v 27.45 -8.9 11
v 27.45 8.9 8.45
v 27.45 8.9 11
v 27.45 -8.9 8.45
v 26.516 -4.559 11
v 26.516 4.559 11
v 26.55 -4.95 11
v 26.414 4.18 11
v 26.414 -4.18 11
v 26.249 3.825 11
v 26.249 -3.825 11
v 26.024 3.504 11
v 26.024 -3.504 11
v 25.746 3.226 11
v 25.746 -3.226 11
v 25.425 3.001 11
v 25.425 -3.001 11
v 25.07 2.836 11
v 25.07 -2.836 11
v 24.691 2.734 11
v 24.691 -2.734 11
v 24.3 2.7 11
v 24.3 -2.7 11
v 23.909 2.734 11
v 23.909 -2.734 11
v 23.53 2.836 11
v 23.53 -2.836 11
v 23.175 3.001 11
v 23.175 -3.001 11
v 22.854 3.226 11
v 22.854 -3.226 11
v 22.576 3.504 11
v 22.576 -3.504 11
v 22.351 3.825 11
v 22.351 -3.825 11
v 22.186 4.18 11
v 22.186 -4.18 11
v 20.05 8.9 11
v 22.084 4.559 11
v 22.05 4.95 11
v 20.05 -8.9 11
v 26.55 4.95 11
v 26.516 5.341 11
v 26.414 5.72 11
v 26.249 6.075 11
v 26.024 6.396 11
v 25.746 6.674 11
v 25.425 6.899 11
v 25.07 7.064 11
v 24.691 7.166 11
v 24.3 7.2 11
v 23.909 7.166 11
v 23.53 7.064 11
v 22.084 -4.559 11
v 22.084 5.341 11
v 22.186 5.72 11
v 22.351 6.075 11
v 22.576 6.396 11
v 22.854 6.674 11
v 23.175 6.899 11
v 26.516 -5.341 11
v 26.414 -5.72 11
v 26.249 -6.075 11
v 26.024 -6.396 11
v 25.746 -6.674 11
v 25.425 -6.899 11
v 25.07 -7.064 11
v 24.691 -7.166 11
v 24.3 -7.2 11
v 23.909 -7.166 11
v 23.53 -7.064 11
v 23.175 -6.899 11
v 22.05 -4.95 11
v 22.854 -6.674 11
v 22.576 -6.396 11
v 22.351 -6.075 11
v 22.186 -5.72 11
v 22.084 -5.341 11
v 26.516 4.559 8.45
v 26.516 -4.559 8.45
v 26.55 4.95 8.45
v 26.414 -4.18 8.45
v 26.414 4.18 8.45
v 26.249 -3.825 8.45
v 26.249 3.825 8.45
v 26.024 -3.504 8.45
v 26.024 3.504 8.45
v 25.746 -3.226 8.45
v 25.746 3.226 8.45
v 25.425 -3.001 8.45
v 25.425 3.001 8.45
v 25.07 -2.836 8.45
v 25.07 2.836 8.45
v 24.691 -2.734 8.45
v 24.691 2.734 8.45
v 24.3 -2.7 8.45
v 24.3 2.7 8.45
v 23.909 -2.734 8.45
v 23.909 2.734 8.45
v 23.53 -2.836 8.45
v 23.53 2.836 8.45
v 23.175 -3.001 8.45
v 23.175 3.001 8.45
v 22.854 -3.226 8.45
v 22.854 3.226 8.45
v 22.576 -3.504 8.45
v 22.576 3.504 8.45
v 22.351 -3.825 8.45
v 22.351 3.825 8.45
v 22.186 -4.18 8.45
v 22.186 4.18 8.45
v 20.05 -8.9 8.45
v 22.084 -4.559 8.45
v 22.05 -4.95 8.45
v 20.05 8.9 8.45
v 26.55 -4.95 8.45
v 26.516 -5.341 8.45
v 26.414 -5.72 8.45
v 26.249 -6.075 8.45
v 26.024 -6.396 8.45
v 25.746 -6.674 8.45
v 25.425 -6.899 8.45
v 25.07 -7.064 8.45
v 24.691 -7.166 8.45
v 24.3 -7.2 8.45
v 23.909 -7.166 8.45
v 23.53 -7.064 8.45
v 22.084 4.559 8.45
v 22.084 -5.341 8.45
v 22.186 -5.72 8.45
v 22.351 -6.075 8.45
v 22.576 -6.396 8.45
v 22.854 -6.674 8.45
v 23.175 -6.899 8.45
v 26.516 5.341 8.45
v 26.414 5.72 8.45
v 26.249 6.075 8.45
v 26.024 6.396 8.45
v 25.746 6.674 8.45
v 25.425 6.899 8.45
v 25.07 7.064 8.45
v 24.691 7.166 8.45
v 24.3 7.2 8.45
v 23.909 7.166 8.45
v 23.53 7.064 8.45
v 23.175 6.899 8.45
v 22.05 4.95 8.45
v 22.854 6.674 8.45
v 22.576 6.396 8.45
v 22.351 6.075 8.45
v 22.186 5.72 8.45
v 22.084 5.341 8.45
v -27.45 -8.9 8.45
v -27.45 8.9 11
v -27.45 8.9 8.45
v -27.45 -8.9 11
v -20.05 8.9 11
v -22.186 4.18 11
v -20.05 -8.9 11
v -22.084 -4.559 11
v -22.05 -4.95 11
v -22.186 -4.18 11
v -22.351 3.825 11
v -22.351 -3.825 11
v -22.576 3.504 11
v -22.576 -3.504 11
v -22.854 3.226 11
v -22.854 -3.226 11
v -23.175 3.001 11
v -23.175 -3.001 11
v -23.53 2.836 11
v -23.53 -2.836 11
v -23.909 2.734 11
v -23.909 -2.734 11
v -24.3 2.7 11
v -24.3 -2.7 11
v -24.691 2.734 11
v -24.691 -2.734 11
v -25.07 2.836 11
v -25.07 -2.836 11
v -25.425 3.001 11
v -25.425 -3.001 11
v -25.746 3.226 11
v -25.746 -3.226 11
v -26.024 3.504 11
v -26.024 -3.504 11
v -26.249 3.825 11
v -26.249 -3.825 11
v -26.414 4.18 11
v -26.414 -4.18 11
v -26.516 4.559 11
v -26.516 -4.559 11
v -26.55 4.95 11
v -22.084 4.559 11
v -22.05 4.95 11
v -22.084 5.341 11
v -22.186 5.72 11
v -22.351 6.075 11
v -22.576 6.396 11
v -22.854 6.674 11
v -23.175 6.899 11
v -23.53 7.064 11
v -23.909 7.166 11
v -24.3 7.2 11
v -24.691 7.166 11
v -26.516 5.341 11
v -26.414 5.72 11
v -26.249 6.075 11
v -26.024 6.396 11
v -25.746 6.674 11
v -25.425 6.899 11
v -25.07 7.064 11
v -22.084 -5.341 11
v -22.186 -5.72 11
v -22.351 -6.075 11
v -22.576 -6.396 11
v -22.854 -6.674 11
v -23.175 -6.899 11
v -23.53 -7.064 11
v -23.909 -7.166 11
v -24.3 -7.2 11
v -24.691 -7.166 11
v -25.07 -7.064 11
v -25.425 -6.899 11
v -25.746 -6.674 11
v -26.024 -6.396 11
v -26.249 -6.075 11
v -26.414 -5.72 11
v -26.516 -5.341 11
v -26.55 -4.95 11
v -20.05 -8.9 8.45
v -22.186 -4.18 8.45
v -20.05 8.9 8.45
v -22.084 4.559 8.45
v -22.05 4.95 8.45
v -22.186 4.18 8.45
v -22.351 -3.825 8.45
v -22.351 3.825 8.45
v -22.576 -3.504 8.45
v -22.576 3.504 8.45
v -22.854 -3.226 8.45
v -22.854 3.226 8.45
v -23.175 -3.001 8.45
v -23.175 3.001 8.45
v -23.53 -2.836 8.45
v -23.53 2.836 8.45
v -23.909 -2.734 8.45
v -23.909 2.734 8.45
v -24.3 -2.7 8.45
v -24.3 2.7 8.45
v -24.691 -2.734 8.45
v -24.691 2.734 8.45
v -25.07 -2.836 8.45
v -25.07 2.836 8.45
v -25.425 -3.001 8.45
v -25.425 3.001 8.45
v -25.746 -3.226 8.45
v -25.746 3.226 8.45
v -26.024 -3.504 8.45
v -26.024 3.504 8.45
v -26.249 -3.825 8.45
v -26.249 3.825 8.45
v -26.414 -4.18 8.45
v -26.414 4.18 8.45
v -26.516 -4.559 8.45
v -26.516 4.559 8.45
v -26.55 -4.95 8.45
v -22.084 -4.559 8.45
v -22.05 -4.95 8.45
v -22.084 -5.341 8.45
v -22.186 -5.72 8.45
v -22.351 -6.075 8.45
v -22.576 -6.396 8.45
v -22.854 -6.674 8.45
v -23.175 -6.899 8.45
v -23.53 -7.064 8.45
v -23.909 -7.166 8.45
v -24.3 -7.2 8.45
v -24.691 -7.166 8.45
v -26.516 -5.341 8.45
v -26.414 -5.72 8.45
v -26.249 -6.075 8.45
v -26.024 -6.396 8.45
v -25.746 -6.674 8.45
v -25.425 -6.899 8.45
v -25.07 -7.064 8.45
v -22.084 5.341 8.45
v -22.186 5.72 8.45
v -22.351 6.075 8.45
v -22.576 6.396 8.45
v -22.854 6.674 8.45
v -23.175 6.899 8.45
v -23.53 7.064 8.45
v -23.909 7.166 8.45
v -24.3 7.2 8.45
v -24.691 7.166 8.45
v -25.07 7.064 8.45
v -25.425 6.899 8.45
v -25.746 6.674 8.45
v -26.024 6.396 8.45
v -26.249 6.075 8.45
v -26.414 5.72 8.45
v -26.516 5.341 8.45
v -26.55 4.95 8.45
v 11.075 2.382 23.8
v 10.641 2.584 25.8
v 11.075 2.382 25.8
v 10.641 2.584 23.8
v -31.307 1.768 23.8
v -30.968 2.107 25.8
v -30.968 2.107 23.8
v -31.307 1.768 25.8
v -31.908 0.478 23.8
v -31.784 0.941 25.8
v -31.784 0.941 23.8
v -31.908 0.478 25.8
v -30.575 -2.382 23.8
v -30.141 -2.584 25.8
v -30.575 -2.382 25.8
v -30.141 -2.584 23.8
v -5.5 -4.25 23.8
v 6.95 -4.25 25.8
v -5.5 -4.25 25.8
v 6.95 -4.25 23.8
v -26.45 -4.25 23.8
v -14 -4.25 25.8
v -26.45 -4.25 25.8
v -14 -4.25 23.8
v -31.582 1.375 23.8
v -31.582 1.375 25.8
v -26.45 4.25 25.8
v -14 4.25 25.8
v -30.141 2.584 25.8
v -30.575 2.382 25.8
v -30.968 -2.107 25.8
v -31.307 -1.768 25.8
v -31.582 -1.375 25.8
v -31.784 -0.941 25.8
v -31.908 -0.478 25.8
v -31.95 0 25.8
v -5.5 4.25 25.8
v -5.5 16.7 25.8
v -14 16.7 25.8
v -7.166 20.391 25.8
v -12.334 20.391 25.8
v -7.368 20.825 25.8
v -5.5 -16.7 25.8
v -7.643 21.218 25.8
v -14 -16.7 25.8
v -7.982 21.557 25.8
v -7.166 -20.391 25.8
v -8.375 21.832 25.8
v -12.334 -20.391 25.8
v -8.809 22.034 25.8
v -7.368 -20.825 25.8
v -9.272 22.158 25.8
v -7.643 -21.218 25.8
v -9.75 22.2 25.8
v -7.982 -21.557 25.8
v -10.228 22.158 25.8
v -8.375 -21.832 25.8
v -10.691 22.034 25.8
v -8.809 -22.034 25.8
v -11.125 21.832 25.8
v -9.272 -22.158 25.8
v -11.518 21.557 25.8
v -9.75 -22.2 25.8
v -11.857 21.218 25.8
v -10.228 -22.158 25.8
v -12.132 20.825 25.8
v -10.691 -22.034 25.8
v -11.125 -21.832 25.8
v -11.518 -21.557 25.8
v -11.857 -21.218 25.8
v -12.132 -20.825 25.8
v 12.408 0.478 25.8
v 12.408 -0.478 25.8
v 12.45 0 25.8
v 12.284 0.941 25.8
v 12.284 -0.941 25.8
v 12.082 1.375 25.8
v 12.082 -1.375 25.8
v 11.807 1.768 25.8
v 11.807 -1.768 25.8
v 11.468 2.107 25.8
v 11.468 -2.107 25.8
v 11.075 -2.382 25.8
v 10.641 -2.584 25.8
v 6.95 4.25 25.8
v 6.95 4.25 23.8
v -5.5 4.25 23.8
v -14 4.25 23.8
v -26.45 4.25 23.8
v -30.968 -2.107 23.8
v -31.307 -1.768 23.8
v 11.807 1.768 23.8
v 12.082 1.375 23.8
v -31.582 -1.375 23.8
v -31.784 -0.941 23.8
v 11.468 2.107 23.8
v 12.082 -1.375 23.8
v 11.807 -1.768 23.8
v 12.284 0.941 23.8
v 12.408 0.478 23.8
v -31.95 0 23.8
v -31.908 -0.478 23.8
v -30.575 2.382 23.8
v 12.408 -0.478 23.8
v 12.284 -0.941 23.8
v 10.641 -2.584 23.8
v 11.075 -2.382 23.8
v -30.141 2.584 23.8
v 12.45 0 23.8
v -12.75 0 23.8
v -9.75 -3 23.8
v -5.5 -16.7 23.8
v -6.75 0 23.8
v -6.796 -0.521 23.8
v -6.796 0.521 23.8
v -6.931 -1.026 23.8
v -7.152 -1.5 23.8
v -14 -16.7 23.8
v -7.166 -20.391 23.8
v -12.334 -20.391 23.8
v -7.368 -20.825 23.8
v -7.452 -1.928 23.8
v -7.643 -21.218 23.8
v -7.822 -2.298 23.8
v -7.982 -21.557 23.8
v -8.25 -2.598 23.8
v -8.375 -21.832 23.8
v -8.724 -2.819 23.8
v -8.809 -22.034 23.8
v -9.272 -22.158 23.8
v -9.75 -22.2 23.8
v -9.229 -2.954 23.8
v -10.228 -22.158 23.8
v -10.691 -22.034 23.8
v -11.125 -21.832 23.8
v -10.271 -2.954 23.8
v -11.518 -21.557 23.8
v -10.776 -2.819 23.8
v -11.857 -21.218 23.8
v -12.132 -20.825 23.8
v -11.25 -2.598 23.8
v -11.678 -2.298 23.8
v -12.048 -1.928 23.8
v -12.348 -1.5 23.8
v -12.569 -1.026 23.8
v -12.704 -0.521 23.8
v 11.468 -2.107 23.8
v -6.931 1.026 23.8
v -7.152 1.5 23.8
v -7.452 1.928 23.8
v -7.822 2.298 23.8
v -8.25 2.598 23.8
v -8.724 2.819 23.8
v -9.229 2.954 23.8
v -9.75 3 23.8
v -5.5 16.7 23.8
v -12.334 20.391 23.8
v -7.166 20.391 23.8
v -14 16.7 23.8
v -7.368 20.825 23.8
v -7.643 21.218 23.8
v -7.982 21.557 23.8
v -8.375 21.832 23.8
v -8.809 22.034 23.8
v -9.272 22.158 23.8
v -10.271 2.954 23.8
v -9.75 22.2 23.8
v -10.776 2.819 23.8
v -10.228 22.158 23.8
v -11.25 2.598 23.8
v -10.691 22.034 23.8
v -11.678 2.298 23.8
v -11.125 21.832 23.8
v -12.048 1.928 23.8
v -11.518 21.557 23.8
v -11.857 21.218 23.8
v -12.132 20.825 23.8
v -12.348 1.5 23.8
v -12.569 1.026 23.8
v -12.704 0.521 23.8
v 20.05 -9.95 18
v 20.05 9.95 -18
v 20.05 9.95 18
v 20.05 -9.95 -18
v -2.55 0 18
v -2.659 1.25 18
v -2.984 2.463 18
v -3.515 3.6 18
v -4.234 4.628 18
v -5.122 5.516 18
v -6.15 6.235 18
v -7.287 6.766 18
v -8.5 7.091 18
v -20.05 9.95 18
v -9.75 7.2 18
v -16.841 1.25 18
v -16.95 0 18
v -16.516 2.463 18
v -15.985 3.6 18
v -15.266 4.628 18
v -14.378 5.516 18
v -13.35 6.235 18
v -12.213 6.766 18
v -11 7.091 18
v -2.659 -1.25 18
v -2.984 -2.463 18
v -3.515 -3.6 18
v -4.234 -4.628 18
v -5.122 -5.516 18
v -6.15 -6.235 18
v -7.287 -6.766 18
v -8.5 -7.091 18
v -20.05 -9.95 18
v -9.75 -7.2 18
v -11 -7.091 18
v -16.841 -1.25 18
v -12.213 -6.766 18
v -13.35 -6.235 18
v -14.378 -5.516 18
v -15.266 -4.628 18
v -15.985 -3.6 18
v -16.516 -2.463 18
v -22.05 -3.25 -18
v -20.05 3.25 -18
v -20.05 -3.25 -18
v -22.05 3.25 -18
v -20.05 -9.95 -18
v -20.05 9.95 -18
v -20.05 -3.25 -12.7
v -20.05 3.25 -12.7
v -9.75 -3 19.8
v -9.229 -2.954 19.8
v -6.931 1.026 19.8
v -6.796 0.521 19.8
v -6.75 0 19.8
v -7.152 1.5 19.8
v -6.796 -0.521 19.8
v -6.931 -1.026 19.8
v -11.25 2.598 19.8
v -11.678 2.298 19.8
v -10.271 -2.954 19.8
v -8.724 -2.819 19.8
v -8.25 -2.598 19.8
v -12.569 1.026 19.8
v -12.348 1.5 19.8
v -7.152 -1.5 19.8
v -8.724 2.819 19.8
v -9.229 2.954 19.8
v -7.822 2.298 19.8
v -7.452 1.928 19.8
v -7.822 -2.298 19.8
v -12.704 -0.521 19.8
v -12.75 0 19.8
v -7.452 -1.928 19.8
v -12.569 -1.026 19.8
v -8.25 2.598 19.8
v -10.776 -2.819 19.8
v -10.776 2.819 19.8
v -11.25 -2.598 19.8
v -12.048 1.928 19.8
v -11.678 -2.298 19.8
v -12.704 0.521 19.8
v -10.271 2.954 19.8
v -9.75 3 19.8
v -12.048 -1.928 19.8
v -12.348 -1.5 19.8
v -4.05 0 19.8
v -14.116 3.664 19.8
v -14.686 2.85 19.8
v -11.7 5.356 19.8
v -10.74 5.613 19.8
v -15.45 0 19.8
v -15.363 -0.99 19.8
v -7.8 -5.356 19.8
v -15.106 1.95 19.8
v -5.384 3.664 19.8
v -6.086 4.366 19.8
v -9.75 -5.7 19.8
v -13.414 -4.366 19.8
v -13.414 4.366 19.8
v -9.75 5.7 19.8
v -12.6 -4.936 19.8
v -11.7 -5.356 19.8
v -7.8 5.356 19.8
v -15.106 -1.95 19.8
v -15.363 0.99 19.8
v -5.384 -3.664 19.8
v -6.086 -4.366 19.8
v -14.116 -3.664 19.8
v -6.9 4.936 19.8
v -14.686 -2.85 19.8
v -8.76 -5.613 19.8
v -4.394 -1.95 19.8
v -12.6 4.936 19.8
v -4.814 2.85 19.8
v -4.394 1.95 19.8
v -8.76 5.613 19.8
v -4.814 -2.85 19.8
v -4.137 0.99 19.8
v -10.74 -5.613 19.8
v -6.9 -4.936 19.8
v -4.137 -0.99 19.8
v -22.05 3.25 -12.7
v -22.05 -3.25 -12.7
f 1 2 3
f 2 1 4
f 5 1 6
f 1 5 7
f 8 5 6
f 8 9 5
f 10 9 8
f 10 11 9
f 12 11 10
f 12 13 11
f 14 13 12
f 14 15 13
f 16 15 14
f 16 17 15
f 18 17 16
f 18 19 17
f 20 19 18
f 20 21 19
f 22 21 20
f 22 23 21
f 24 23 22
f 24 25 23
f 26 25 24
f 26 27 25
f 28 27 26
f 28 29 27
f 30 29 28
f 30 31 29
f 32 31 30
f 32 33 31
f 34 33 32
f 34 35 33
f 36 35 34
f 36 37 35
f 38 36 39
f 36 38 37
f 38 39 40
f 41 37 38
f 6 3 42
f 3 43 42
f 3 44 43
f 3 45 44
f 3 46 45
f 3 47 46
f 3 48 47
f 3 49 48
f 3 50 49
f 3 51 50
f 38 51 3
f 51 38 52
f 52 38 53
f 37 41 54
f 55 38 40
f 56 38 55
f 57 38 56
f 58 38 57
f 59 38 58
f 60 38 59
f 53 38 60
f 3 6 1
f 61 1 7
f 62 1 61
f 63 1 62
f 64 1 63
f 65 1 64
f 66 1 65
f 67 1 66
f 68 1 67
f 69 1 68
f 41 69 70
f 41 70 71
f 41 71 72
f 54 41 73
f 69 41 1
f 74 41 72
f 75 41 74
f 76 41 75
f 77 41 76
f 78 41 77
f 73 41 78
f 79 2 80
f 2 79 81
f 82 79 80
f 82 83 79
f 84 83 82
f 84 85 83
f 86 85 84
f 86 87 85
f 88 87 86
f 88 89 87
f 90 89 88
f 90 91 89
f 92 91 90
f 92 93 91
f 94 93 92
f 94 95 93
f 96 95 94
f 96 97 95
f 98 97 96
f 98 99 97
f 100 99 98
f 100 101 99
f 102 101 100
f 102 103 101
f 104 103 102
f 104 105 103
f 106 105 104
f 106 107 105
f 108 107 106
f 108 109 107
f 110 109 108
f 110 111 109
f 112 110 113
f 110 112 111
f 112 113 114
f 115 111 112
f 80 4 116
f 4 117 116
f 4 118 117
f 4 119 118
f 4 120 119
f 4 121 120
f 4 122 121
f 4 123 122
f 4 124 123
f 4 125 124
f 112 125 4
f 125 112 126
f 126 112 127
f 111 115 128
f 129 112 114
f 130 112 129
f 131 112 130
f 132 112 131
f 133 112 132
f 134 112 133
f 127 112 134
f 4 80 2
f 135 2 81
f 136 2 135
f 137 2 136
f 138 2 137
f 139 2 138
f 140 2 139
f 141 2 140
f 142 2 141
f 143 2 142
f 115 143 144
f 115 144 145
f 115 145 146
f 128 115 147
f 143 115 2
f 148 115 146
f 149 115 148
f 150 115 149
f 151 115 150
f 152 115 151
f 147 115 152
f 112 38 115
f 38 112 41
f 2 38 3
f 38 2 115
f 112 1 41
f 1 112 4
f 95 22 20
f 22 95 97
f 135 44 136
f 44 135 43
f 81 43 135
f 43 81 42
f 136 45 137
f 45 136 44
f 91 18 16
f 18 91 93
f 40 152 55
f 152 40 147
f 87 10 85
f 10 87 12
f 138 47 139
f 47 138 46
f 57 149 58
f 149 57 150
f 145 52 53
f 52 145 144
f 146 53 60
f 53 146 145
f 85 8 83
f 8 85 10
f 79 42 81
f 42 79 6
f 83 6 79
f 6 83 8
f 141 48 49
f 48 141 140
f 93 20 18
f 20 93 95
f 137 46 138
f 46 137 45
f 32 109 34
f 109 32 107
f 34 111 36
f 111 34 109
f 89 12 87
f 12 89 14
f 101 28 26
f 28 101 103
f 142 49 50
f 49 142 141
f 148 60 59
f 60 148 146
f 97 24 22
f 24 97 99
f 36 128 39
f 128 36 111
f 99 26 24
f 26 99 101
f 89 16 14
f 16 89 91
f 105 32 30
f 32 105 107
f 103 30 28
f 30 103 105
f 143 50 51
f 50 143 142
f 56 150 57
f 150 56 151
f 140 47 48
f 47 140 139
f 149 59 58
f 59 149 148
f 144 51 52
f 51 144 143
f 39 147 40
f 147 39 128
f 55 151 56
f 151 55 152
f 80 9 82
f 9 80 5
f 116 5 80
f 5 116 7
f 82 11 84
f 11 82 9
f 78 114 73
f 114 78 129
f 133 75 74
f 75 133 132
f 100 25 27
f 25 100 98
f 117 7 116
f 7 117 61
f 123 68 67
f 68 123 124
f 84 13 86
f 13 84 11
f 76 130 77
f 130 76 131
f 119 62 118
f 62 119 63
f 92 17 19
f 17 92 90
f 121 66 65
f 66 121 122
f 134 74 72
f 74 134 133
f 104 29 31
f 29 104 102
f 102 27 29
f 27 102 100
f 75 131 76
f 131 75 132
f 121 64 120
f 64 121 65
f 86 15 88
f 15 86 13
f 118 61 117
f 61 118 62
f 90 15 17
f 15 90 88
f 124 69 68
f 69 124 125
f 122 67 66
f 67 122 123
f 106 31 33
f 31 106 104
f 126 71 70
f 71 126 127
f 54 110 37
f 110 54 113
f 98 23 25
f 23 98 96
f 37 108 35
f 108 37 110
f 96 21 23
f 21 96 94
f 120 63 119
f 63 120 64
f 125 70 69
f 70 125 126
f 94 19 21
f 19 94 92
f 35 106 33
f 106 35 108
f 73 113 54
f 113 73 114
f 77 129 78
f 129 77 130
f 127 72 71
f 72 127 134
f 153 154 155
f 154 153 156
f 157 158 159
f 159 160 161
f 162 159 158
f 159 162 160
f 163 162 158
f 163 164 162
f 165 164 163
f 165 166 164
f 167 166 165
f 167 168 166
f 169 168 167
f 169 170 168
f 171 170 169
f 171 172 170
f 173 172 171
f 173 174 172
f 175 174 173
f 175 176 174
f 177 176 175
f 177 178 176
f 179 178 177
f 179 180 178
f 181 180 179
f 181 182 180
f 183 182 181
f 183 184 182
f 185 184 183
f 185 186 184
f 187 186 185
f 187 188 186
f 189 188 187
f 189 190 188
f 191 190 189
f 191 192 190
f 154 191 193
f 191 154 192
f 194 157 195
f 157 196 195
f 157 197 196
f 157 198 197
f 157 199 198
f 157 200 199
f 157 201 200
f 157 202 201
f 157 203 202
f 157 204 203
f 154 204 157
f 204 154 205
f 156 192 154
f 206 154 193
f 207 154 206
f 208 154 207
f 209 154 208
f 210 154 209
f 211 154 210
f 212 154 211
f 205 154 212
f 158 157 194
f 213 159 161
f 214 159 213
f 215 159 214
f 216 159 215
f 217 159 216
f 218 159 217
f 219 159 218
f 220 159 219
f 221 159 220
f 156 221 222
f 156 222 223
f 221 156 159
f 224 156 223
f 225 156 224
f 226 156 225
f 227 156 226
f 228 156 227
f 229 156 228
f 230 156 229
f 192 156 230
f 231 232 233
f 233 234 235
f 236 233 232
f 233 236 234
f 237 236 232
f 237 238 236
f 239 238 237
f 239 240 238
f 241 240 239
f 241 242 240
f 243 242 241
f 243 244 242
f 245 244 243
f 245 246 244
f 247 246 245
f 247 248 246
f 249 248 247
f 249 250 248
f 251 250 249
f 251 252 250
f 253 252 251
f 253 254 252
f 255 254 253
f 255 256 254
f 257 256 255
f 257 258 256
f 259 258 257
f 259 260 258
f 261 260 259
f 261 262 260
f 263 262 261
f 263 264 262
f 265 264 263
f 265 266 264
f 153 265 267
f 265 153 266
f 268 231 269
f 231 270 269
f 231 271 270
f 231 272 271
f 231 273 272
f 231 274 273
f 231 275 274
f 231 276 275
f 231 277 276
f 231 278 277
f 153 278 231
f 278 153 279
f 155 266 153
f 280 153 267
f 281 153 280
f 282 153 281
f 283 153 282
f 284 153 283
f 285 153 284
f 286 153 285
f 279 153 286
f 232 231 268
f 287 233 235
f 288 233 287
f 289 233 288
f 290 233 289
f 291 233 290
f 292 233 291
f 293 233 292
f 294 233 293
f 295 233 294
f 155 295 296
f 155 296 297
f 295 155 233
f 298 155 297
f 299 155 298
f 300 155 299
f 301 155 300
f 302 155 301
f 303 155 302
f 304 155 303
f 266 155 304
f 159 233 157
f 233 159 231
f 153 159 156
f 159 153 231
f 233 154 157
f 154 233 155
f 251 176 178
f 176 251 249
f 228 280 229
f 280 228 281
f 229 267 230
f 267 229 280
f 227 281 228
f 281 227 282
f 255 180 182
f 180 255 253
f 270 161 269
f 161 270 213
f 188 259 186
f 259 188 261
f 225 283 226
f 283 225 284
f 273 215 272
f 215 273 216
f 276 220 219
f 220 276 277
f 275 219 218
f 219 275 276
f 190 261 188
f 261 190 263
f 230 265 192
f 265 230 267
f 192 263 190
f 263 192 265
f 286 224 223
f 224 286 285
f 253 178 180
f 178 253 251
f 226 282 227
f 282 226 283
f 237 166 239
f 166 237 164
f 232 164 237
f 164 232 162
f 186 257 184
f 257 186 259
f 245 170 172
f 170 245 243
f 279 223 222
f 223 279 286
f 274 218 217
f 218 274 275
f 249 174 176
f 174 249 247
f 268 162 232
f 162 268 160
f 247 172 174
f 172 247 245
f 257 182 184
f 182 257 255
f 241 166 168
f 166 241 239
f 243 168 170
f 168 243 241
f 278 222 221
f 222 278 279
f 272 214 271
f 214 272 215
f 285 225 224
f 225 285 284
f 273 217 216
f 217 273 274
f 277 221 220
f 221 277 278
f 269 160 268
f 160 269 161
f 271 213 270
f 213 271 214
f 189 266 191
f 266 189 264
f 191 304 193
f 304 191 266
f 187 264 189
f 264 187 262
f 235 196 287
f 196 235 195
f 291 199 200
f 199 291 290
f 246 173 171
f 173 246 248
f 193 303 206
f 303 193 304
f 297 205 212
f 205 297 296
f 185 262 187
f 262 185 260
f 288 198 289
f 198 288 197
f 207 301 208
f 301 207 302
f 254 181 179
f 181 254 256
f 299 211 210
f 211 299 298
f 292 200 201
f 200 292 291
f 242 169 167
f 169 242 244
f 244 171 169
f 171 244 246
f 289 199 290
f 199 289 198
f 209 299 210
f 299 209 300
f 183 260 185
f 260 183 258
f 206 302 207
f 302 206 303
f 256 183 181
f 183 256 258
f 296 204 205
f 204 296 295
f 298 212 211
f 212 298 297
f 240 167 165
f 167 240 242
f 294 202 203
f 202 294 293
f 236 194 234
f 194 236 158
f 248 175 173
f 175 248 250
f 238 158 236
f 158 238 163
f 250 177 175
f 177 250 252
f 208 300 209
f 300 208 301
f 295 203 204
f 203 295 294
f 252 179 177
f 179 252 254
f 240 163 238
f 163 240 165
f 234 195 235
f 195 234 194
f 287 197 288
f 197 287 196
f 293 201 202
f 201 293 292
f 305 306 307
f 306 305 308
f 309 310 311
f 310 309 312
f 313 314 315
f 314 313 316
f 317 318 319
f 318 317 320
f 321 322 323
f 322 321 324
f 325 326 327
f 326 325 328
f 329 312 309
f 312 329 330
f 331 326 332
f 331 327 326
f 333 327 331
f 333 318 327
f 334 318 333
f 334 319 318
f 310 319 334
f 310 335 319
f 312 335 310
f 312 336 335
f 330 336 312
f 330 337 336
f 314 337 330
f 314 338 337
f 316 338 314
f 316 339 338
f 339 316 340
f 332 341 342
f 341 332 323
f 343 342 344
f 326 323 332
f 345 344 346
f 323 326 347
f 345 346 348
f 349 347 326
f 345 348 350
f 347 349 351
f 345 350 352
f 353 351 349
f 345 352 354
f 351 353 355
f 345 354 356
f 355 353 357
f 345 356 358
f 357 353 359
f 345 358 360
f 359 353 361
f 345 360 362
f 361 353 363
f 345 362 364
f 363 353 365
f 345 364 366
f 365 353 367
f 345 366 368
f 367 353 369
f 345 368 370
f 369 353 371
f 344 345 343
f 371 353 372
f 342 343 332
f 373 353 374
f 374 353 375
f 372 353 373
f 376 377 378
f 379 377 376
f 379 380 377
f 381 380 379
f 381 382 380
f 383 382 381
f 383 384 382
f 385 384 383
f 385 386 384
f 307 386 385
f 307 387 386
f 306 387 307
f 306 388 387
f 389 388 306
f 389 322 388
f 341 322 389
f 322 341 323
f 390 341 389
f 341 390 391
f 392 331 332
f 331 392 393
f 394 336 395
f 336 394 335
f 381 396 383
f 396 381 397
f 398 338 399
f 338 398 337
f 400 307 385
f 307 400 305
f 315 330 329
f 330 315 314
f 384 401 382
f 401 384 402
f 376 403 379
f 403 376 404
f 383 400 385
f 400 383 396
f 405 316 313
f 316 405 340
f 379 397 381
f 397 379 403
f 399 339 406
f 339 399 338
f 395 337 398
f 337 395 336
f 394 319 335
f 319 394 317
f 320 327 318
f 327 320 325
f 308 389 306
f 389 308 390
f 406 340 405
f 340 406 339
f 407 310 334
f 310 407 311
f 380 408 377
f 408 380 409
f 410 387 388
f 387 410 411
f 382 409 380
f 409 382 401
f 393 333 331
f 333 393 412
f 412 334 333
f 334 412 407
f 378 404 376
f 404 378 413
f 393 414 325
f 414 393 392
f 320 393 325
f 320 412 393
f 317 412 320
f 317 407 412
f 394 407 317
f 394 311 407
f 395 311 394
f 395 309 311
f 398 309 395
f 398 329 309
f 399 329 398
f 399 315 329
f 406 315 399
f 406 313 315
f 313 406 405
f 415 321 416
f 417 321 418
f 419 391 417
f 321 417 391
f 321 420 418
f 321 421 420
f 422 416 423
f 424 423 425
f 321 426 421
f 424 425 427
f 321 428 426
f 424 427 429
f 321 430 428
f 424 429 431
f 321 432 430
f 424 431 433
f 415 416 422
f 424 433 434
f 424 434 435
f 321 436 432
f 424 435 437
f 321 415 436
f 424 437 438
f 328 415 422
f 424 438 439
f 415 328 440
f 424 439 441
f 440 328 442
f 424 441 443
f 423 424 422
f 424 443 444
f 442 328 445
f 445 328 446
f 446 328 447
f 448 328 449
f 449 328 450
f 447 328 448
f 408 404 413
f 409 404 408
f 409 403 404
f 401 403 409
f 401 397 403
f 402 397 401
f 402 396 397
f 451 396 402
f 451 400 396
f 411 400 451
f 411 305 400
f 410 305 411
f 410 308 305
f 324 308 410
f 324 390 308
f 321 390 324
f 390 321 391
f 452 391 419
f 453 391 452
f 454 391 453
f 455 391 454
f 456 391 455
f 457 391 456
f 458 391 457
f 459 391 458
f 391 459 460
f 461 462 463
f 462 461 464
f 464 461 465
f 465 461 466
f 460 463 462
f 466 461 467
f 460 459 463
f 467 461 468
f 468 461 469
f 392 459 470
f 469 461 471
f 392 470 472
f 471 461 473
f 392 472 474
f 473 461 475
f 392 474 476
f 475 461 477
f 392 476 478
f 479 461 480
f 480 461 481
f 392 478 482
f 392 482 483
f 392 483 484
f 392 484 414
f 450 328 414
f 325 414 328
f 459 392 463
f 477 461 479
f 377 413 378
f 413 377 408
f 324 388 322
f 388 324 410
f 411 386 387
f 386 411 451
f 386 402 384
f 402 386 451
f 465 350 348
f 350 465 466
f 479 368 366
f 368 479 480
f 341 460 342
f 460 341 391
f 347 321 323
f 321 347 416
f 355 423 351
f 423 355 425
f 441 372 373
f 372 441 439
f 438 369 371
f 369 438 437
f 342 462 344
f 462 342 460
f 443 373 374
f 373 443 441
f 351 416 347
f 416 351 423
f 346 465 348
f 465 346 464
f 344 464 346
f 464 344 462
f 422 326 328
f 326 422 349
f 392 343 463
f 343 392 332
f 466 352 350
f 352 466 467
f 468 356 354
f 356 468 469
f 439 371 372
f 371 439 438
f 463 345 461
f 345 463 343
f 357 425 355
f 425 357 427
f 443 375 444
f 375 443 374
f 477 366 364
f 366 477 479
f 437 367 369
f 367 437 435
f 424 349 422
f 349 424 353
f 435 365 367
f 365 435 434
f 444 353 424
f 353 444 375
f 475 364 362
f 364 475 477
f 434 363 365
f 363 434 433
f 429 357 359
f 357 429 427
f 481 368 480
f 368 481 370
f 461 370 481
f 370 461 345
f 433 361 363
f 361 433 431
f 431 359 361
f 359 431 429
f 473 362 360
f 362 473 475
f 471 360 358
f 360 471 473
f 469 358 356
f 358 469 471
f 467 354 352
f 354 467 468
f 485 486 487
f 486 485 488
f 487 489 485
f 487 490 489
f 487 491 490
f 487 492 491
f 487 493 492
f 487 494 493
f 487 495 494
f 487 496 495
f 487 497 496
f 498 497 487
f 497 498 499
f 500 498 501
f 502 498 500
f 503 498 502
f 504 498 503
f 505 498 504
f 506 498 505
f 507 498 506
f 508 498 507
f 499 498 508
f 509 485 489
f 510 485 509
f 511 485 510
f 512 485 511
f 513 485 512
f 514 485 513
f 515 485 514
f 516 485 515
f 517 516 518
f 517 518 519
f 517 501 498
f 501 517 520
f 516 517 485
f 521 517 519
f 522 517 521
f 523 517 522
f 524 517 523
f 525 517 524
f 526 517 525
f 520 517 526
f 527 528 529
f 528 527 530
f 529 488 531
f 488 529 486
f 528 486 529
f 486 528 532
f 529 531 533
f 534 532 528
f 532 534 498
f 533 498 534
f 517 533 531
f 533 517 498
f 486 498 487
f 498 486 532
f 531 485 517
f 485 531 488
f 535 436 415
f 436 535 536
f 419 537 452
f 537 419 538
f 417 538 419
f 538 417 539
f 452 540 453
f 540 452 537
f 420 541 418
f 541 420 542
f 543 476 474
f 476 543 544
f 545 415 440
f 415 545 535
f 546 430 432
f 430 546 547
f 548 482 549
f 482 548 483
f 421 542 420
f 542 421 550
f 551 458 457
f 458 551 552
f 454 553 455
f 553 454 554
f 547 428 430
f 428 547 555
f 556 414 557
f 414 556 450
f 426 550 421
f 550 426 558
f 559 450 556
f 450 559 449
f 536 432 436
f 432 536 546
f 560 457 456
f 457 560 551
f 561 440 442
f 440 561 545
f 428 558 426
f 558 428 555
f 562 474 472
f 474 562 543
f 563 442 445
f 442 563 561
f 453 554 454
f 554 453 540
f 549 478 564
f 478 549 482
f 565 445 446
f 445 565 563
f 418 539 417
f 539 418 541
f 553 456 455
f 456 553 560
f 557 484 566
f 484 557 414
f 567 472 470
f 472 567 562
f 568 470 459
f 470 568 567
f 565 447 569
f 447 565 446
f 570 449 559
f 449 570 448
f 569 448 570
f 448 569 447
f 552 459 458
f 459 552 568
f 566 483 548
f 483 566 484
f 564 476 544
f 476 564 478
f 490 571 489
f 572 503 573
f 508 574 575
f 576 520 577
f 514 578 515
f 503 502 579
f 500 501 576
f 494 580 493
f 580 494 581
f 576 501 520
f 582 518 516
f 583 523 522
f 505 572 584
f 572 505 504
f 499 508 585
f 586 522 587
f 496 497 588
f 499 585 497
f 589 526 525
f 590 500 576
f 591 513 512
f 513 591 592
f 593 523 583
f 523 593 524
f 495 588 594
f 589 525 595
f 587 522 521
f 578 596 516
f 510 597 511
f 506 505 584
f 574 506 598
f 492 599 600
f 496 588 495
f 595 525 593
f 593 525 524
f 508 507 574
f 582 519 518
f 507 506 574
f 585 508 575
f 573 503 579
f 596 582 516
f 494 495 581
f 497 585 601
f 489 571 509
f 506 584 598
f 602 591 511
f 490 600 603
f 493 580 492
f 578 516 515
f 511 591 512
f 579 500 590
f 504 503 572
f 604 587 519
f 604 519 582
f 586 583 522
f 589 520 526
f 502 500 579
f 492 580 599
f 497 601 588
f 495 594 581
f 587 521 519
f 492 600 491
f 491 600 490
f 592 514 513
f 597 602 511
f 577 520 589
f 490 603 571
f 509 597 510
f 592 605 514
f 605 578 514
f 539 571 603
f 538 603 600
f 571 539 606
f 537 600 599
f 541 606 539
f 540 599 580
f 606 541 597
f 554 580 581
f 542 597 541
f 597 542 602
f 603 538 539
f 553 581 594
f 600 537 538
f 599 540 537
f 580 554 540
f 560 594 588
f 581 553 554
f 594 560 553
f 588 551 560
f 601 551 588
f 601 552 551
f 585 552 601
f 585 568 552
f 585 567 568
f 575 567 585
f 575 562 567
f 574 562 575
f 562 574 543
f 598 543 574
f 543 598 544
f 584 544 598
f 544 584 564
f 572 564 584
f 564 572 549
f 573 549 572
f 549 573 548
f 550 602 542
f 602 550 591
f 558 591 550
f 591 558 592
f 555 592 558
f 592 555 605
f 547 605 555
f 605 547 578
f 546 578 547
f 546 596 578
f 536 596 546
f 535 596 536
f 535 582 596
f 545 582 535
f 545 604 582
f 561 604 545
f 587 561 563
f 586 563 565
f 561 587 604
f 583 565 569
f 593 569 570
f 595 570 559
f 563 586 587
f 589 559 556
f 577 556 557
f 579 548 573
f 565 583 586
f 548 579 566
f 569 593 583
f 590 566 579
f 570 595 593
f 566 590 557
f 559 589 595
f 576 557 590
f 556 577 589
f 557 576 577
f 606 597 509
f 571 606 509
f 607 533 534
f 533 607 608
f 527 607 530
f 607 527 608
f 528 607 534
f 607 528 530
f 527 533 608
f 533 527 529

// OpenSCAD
/*
Futaba S3004 servo
Aaron Ciuffo - aaron dot ciuffo 2 gmail

This library produces a fotuaba S3004 futaba servo or a projection for cutting
a hole in a 2D shape for a laser cutter.  

The scale of the projected hole for the body can be adjusted below

It can be used in other models by calling:

  import <futaba_s3004.scad>
  futaba();

The library can also produce a 2D projection that is useful for making a cutout for
a DXF to be used with a laser cutter:
  futaba(project=true)
 
To produce a projection that includes pilot holes for wood screws use:
  futaba(project, bolt=false);




V1 11 November 2014


*/
/*[Setup]*/
$fn=36; //curve refinement

/*[Body Dimensions]*/
bX=40.1;
bY=19.9;
bZ=36;

/*[Flange Dimensions and position]*/
fX=7.4;
fY=17.8;
fZ=2.55;
//flange distance from Base
flangeFromB=26.4;
fBoltDia=4.5;
fBoltRad=fBoltDia/2;
fScrewDia=2.1;
fScrewRad=fScrewDia/2;
fScrewPilot=fScrewRad*.5;

//position from edges
fScrewY=1.7;
fScrewX=0.9;
fScrewZ=7.0;

/*[Shaft Dimensions and Position]*/
shaftDia=6;
shaftRad=shaftDia/2;
shaftZ=6;
shaftX=7.3+shaftRad;
shaftS1=14.4/2;
shaftS2=11.4/2;
shaftSZ=1.8;

/*[Horn Dimensions]*/
hornZ=2.0; 
hornX=38.9;
hornY=hornX;
hornArmX=8.5;
hornRad=5.5/2;

//horn location
hornZoverB=7.8; //height of horn over top of body
hornZoverShaft=hornZoverB-shaftZ; //horn height over shaft



/*[Wire Gland]*/
wireX=2;
wireY=6.5;
wireZ=5.3;


module horn() {
  union() {
    hull() {
      cube([hornX-2*hornRad, hornArmX, hornZ], center=true);
      translate([hornX/2, 0, 0])
        cylinder(h=hornZ, r=hornRad, center=true);
      translate([-hornX/2, 0, 0])
        cylinder(h=hornZ, r=hornRad, center=true);

    }
    
    hull() {
      cube([hornArmX, hornY-2*hornRad, hornZ], center=true);
       translate([0, hornY/2, 0])
        cylinder(h=hornZ, r=hornRad, center=true);
      translate([0, -hornY/2, 0])
        cylinder(h=hornZ, r=hornRad, center=true);
   }
 }
    
  
}

module flange(project=false, bolt=true) {
  fHoleRad= bolt==true ? fBoltRad : fScrewPilot;
  
  if (project==false) {
    difference() {
      cube([fX, fY, fZ], center=true);
      translate([fX/2-fBoltRad-fScrewX, fY/2-fBoltRad-fScrewY, 0])
        cylinder(h=fZ*2, r=fHoleRad, center=true);
      translate([fX/2-fBoltRad-fScrewX, -fY/2+fBoltRad+fScrewY, 0])
        cylinder(h=fZ*2, r=fHoleRad, center=true);
    }
  }

  //leave the cylinders in place for projecting a bolt hole
  if (project==true) {
    translate([fX/2-fScrewRad-fScrewX, fY/2-fScrewRad-fScrewY, 0])
      cylinder(h=fZ*2, r=fScrewRad, center=true);
    translate([fX/2-fScrewRad-fScrewX, -fY/2+fScrewRad+fScrewY, 0])
      cylinder(h=fZ*2, r=fScrewRad, center=true);
  
  }

}


module body(project=false, bolt=true, scalePct=1.05, horn=false) {
  scalePctLoc= project==true ? scalePct : 1;
  union() {
    color("gray")
      scale(scalePctLoc) cube([bX, bY, bZ], center=true);
    color("red")
      translate([bX/2+fX/2, 0, bZ/2-fZ/2-fScrewZ])
        flange(project, bolt);
    color("red")
      translate([-bX/2-fX/2, 0, bZ/2-fZ/2-fScrewZ]) rotate([0, 0, 180])
        flange(project, bolt);
    translate([-bX/2+shaftX, 0, bZ/2]) color("green")
      cylinder(h=shaftZ, r=shaftRad);
    translate([-bX/2+shaftX, 0, bZ/2]) color("blue")
      cylinder(h=shaftSZ, r1=shaftS1, r2=shaftS2);
    color("purple")
      translate([-bX/2-wireX/2, 0, -bZ/2+wireZ/2])
        cube([wireX, wireY, wireZ], center=true);
    if (horn==true) {
      color("yellow")
        translate([-bX/2+shaftX, 0, bZ/2+shaftZ-hornZ/2+hornZoverShaft])
          horn();
    }
  }

}

module futaba(project=false, bolt=true, scalePct, center="main", horn=false) {
  
  //hrn=horn; //WTF?  why do I need this?
  // move everything down to put the horn at the origin
  hornZoffset= horn==true ? hornZoverShaft : 0;

  if (project==true) {
    projection() body(project, bolt, scalePct);
  } else {
    if (center=="shaft") {
      translate([bX/2-shaftX, 0, -bZ/2-shaftZ-hornZoffset])
        body(project, bolt, horn=horn);
    } else if (center=="flange") {
      translate([0, 0, -bZ/2+(bZ-flangeFromB)])
        body(project, bolt, horn=horn);
      
    } else{
      body(project, bolt, horn=horn);
    }
  }
 
}

futaba(project=false, bolt=true, center="false", horn=true);
//futaba(project=true, bolt=false, scalePct=1.05);
